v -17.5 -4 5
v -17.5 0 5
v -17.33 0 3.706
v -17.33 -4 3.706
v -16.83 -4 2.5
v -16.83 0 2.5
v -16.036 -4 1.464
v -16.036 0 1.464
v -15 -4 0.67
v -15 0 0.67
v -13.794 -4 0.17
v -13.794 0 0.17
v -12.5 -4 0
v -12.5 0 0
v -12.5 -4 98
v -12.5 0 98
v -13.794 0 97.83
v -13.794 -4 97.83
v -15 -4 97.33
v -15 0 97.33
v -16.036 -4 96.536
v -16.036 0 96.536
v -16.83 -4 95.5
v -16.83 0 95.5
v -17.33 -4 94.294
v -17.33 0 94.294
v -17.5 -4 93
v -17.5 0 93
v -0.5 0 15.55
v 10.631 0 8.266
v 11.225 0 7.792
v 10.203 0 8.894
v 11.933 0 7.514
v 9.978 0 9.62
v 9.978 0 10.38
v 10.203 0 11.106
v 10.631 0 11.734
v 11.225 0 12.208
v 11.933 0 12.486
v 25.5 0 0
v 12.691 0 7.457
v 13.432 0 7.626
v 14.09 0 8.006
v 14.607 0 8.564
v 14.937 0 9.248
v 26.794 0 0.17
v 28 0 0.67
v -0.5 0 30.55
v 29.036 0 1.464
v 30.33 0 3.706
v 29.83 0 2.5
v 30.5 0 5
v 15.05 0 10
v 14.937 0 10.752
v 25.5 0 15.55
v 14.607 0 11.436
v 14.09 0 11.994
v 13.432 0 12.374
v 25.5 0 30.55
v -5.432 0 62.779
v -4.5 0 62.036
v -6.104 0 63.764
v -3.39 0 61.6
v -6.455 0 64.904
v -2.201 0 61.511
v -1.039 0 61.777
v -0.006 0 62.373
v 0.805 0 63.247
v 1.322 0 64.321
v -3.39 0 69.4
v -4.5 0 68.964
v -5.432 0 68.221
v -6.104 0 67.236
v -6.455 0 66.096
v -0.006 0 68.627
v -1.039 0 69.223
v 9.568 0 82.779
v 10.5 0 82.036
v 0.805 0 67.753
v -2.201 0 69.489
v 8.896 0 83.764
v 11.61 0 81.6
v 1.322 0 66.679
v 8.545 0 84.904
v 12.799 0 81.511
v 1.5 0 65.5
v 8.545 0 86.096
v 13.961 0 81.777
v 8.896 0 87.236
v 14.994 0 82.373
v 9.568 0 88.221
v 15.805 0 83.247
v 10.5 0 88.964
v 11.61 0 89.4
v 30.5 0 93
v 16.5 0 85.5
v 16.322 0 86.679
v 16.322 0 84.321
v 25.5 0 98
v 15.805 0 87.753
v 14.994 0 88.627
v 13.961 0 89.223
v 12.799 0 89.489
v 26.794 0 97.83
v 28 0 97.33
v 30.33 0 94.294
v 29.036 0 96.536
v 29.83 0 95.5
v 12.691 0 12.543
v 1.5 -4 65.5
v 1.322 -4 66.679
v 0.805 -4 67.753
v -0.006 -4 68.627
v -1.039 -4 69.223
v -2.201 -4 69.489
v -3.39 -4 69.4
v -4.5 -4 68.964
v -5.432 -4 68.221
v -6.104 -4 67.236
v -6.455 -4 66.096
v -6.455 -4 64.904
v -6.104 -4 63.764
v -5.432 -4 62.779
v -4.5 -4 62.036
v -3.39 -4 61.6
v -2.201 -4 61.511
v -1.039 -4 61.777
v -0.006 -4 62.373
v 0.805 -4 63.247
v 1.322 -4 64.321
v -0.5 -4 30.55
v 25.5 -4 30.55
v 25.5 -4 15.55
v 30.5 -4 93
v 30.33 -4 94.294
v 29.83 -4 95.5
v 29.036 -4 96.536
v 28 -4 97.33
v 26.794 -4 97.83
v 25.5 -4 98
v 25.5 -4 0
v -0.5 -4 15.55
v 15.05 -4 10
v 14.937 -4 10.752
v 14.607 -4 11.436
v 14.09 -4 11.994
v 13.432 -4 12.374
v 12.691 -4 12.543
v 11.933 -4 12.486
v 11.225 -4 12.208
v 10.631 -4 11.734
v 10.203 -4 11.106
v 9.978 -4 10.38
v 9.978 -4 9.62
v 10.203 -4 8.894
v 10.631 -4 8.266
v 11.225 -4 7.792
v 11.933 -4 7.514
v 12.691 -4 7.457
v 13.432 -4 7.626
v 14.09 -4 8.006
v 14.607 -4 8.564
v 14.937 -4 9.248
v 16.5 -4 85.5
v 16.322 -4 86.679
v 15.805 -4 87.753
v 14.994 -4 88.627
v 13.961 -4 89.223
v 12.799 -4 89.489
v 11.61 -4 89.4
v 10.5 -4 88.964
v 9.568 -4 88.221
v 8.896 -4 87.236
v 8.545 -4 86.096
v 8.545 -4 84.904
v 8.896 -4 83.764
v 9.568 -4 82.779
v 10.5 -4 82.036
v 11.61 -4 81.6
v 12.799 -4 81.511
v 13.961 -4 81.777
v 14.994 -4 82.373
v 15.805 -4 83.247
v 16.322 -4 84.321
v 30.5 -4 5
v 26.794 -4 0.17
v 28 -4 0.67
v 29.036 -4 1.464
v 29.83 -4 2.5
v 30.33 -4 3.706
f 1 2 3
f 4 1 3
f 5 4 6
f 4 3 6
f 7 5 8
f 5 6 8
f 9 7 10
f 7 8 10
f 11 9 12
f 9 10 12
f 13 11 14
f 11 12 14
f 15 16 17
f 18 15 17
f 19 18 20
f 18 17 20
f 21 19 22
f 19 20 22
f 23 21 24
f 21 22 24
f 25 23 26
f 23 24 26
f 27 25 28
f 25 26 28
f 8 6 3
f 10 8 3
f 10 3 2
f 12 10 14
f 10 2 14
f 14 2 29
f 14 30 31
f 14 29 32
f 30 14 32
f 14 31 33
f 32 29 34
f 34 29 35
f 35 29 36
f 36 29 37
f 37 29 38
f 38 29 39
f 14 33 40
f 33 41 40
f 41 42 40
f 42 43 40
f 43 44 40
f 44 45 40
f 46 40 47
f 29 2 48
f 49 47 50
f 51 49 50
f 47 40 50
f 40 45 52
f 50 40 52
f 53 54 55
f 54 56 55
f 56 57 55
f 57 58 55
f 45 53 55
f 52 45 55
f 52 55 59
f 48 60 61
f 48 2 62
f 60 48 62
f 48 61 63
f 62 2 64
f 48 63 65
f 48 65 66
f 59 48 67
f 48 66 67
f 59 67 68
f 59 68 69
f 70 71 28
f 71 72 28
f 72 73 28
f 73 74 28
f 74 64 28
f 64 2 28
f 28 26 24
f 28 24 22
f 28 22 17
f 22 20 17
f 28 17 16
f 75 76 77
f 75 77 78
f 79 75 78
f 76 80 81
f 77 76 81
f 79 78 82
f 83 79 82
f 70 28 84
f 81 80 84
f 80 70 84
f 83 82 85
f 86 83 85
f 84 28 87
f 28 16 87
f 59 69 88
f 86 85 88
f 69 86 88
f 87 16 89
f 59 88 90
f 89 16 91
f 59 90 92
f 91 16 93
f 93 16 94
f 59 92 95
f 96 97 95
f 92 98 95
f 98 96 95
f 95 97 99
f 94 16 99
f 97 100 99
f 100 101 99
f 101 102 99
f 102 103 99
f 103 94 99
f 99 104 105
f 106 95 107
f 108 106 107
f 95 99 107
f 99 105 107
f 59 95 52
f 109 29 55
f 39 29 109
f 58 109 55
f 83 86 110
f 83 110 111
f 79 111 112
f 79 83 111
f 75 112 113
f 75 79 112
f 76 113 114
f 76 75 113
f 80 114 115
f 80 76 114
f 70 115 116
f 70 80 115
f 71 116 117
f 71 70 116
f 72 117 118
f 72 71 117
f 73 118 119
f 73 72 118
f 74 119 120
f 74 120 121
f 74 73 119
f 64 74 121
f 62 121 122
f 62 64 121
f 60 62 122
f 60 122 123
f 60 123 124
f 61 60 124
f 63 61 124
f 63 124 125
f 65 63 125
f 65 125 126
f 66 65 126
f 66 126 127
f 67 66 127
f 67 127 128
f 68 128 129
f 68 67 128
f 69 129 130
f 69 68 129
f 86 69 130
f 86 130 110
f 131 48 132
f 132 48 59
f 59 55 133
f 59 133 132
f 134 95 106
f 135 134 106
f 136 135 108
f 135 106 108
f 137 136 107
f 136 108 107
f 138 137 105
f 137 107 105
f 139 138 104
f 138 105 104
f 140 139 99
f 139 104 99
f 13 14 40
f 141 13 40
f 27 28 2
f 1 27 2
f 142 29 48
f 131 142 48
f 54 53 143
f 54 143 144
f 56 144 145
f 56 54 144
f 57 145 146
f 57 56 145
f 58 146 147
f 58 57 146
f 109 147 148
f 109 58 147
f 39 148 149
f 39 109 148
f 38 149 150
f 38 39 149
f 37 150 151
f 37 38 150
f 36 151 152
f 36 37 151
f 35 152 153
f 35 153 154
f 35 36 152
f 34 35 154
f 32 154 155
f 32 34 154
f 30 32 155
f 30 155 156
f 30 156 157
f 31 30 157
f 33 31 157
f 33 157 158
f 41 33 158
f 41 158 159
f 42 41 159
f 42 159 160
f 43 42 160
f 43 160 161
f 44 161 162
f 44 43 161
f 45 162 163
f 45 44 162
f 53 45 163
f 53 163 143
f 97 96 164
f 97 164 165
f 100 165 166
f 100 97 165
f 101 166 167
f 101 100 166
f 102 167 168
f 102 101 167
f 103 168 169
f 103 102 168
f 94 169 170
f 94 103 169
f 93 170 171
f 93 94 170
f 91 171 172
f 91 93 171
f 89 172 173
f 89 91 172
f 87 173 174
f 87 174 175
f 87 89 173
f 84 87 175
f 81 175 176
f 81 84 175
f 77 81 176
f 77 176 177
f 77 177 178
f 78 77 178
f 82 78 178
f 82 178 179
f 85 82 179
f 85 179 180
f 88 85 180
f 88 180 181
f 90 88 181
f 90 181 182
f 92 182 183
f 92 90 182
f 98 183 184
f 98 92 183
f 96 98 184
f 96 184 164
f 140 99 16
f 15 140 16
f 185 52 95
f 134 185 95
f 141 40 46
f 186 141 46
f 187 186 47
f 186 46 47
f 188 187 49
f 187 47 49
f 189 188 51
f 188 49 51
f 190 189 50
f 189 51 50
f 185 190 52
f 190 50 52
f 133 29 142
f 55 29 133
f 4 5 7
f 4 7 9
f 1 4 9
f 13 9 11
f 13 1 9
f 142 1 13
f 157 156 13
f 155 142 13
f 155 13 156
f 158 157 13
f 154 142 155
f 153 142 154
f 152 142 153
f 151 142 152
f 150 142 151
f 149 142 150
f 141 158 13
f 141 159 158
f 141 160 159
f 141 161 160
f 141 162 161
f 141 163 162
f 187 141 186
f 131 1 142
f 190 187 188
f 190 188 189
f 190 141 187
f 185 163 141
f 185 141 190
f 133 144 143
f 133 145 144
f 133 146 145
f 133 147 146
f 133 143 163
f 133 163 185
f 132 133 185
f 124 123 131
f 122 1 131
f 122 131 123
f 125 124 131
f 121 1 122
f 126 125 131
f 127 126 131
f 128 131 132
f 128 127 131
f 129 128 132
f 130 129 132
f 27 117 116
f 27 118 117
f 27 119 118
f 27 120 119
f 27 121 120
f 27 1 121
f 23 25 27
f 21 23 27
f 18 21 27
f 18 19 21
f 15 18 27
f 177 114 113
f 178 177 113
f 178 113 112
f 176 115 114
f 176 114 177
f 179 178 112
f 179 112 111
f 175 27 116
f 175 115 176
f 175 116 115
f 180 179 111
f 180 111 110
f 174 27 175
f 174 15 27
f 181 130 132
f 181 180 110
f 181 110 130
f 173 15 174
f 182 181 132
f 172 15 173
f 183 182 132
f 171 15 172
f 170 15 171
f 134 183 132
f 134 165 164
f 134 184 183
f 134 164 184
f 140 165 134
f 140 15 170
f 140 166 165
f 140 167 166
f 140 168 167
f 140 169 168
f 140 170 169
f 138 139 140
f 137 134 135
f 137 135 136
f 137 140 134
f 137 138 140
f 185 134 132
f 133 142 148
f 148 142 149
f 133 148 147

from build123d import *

# Parameters (mm, degrees)
F0_R     = 2.55
F0_W     = 26
F0_H     = 15
F0_R_2   = 4
F1_DEPTH = 4


with BuildPart() as f1:
    # F0 (on Front) → F1 (new body)
    with BuildSketch(Plane.XZ):
        with BuildLine():
            Line((-17.5, 93), (-17.5, 5))
            ThreePointArc((-17.5, 5), (-16.035534, 1.464466), (-12.5, 0))
            Line((-12.5, 0), (25.5, 0))
            ThreePointArc((25.5, 0), (29.035534, 1.464466), (30.5, 5))
            Line((30.5, 5), (30.5, 93))
            ThreePointArc((30.5, 93), (29.035534, 96.535534), (25.5, 98))
            Line((25.5, 98), (-12.5, 98))
            ThreePointArc((-12.5, 98), (-16.035534, 96.535534), (-17.5, 93))
        make_face()
        with Locations((12.5, 10)):
            Circle(F0_R, mode=Mode.SUBTRACT)
        with Locations((12.5, 23.05)):
            Rectangle(F0_W, F0_H, mode=Mode.SUBTRACT)
        with Locations((-2.5, 65.5)):
            Circle(F0_R_2, mode=Mode.SUBTRACT)
        with Locations((12.5, 85.5)):
            Circle(F0_R_2, mode=Mode.SUBTRACT)
    extrude(amount=F1_DEPTH)


solid = f1.part
